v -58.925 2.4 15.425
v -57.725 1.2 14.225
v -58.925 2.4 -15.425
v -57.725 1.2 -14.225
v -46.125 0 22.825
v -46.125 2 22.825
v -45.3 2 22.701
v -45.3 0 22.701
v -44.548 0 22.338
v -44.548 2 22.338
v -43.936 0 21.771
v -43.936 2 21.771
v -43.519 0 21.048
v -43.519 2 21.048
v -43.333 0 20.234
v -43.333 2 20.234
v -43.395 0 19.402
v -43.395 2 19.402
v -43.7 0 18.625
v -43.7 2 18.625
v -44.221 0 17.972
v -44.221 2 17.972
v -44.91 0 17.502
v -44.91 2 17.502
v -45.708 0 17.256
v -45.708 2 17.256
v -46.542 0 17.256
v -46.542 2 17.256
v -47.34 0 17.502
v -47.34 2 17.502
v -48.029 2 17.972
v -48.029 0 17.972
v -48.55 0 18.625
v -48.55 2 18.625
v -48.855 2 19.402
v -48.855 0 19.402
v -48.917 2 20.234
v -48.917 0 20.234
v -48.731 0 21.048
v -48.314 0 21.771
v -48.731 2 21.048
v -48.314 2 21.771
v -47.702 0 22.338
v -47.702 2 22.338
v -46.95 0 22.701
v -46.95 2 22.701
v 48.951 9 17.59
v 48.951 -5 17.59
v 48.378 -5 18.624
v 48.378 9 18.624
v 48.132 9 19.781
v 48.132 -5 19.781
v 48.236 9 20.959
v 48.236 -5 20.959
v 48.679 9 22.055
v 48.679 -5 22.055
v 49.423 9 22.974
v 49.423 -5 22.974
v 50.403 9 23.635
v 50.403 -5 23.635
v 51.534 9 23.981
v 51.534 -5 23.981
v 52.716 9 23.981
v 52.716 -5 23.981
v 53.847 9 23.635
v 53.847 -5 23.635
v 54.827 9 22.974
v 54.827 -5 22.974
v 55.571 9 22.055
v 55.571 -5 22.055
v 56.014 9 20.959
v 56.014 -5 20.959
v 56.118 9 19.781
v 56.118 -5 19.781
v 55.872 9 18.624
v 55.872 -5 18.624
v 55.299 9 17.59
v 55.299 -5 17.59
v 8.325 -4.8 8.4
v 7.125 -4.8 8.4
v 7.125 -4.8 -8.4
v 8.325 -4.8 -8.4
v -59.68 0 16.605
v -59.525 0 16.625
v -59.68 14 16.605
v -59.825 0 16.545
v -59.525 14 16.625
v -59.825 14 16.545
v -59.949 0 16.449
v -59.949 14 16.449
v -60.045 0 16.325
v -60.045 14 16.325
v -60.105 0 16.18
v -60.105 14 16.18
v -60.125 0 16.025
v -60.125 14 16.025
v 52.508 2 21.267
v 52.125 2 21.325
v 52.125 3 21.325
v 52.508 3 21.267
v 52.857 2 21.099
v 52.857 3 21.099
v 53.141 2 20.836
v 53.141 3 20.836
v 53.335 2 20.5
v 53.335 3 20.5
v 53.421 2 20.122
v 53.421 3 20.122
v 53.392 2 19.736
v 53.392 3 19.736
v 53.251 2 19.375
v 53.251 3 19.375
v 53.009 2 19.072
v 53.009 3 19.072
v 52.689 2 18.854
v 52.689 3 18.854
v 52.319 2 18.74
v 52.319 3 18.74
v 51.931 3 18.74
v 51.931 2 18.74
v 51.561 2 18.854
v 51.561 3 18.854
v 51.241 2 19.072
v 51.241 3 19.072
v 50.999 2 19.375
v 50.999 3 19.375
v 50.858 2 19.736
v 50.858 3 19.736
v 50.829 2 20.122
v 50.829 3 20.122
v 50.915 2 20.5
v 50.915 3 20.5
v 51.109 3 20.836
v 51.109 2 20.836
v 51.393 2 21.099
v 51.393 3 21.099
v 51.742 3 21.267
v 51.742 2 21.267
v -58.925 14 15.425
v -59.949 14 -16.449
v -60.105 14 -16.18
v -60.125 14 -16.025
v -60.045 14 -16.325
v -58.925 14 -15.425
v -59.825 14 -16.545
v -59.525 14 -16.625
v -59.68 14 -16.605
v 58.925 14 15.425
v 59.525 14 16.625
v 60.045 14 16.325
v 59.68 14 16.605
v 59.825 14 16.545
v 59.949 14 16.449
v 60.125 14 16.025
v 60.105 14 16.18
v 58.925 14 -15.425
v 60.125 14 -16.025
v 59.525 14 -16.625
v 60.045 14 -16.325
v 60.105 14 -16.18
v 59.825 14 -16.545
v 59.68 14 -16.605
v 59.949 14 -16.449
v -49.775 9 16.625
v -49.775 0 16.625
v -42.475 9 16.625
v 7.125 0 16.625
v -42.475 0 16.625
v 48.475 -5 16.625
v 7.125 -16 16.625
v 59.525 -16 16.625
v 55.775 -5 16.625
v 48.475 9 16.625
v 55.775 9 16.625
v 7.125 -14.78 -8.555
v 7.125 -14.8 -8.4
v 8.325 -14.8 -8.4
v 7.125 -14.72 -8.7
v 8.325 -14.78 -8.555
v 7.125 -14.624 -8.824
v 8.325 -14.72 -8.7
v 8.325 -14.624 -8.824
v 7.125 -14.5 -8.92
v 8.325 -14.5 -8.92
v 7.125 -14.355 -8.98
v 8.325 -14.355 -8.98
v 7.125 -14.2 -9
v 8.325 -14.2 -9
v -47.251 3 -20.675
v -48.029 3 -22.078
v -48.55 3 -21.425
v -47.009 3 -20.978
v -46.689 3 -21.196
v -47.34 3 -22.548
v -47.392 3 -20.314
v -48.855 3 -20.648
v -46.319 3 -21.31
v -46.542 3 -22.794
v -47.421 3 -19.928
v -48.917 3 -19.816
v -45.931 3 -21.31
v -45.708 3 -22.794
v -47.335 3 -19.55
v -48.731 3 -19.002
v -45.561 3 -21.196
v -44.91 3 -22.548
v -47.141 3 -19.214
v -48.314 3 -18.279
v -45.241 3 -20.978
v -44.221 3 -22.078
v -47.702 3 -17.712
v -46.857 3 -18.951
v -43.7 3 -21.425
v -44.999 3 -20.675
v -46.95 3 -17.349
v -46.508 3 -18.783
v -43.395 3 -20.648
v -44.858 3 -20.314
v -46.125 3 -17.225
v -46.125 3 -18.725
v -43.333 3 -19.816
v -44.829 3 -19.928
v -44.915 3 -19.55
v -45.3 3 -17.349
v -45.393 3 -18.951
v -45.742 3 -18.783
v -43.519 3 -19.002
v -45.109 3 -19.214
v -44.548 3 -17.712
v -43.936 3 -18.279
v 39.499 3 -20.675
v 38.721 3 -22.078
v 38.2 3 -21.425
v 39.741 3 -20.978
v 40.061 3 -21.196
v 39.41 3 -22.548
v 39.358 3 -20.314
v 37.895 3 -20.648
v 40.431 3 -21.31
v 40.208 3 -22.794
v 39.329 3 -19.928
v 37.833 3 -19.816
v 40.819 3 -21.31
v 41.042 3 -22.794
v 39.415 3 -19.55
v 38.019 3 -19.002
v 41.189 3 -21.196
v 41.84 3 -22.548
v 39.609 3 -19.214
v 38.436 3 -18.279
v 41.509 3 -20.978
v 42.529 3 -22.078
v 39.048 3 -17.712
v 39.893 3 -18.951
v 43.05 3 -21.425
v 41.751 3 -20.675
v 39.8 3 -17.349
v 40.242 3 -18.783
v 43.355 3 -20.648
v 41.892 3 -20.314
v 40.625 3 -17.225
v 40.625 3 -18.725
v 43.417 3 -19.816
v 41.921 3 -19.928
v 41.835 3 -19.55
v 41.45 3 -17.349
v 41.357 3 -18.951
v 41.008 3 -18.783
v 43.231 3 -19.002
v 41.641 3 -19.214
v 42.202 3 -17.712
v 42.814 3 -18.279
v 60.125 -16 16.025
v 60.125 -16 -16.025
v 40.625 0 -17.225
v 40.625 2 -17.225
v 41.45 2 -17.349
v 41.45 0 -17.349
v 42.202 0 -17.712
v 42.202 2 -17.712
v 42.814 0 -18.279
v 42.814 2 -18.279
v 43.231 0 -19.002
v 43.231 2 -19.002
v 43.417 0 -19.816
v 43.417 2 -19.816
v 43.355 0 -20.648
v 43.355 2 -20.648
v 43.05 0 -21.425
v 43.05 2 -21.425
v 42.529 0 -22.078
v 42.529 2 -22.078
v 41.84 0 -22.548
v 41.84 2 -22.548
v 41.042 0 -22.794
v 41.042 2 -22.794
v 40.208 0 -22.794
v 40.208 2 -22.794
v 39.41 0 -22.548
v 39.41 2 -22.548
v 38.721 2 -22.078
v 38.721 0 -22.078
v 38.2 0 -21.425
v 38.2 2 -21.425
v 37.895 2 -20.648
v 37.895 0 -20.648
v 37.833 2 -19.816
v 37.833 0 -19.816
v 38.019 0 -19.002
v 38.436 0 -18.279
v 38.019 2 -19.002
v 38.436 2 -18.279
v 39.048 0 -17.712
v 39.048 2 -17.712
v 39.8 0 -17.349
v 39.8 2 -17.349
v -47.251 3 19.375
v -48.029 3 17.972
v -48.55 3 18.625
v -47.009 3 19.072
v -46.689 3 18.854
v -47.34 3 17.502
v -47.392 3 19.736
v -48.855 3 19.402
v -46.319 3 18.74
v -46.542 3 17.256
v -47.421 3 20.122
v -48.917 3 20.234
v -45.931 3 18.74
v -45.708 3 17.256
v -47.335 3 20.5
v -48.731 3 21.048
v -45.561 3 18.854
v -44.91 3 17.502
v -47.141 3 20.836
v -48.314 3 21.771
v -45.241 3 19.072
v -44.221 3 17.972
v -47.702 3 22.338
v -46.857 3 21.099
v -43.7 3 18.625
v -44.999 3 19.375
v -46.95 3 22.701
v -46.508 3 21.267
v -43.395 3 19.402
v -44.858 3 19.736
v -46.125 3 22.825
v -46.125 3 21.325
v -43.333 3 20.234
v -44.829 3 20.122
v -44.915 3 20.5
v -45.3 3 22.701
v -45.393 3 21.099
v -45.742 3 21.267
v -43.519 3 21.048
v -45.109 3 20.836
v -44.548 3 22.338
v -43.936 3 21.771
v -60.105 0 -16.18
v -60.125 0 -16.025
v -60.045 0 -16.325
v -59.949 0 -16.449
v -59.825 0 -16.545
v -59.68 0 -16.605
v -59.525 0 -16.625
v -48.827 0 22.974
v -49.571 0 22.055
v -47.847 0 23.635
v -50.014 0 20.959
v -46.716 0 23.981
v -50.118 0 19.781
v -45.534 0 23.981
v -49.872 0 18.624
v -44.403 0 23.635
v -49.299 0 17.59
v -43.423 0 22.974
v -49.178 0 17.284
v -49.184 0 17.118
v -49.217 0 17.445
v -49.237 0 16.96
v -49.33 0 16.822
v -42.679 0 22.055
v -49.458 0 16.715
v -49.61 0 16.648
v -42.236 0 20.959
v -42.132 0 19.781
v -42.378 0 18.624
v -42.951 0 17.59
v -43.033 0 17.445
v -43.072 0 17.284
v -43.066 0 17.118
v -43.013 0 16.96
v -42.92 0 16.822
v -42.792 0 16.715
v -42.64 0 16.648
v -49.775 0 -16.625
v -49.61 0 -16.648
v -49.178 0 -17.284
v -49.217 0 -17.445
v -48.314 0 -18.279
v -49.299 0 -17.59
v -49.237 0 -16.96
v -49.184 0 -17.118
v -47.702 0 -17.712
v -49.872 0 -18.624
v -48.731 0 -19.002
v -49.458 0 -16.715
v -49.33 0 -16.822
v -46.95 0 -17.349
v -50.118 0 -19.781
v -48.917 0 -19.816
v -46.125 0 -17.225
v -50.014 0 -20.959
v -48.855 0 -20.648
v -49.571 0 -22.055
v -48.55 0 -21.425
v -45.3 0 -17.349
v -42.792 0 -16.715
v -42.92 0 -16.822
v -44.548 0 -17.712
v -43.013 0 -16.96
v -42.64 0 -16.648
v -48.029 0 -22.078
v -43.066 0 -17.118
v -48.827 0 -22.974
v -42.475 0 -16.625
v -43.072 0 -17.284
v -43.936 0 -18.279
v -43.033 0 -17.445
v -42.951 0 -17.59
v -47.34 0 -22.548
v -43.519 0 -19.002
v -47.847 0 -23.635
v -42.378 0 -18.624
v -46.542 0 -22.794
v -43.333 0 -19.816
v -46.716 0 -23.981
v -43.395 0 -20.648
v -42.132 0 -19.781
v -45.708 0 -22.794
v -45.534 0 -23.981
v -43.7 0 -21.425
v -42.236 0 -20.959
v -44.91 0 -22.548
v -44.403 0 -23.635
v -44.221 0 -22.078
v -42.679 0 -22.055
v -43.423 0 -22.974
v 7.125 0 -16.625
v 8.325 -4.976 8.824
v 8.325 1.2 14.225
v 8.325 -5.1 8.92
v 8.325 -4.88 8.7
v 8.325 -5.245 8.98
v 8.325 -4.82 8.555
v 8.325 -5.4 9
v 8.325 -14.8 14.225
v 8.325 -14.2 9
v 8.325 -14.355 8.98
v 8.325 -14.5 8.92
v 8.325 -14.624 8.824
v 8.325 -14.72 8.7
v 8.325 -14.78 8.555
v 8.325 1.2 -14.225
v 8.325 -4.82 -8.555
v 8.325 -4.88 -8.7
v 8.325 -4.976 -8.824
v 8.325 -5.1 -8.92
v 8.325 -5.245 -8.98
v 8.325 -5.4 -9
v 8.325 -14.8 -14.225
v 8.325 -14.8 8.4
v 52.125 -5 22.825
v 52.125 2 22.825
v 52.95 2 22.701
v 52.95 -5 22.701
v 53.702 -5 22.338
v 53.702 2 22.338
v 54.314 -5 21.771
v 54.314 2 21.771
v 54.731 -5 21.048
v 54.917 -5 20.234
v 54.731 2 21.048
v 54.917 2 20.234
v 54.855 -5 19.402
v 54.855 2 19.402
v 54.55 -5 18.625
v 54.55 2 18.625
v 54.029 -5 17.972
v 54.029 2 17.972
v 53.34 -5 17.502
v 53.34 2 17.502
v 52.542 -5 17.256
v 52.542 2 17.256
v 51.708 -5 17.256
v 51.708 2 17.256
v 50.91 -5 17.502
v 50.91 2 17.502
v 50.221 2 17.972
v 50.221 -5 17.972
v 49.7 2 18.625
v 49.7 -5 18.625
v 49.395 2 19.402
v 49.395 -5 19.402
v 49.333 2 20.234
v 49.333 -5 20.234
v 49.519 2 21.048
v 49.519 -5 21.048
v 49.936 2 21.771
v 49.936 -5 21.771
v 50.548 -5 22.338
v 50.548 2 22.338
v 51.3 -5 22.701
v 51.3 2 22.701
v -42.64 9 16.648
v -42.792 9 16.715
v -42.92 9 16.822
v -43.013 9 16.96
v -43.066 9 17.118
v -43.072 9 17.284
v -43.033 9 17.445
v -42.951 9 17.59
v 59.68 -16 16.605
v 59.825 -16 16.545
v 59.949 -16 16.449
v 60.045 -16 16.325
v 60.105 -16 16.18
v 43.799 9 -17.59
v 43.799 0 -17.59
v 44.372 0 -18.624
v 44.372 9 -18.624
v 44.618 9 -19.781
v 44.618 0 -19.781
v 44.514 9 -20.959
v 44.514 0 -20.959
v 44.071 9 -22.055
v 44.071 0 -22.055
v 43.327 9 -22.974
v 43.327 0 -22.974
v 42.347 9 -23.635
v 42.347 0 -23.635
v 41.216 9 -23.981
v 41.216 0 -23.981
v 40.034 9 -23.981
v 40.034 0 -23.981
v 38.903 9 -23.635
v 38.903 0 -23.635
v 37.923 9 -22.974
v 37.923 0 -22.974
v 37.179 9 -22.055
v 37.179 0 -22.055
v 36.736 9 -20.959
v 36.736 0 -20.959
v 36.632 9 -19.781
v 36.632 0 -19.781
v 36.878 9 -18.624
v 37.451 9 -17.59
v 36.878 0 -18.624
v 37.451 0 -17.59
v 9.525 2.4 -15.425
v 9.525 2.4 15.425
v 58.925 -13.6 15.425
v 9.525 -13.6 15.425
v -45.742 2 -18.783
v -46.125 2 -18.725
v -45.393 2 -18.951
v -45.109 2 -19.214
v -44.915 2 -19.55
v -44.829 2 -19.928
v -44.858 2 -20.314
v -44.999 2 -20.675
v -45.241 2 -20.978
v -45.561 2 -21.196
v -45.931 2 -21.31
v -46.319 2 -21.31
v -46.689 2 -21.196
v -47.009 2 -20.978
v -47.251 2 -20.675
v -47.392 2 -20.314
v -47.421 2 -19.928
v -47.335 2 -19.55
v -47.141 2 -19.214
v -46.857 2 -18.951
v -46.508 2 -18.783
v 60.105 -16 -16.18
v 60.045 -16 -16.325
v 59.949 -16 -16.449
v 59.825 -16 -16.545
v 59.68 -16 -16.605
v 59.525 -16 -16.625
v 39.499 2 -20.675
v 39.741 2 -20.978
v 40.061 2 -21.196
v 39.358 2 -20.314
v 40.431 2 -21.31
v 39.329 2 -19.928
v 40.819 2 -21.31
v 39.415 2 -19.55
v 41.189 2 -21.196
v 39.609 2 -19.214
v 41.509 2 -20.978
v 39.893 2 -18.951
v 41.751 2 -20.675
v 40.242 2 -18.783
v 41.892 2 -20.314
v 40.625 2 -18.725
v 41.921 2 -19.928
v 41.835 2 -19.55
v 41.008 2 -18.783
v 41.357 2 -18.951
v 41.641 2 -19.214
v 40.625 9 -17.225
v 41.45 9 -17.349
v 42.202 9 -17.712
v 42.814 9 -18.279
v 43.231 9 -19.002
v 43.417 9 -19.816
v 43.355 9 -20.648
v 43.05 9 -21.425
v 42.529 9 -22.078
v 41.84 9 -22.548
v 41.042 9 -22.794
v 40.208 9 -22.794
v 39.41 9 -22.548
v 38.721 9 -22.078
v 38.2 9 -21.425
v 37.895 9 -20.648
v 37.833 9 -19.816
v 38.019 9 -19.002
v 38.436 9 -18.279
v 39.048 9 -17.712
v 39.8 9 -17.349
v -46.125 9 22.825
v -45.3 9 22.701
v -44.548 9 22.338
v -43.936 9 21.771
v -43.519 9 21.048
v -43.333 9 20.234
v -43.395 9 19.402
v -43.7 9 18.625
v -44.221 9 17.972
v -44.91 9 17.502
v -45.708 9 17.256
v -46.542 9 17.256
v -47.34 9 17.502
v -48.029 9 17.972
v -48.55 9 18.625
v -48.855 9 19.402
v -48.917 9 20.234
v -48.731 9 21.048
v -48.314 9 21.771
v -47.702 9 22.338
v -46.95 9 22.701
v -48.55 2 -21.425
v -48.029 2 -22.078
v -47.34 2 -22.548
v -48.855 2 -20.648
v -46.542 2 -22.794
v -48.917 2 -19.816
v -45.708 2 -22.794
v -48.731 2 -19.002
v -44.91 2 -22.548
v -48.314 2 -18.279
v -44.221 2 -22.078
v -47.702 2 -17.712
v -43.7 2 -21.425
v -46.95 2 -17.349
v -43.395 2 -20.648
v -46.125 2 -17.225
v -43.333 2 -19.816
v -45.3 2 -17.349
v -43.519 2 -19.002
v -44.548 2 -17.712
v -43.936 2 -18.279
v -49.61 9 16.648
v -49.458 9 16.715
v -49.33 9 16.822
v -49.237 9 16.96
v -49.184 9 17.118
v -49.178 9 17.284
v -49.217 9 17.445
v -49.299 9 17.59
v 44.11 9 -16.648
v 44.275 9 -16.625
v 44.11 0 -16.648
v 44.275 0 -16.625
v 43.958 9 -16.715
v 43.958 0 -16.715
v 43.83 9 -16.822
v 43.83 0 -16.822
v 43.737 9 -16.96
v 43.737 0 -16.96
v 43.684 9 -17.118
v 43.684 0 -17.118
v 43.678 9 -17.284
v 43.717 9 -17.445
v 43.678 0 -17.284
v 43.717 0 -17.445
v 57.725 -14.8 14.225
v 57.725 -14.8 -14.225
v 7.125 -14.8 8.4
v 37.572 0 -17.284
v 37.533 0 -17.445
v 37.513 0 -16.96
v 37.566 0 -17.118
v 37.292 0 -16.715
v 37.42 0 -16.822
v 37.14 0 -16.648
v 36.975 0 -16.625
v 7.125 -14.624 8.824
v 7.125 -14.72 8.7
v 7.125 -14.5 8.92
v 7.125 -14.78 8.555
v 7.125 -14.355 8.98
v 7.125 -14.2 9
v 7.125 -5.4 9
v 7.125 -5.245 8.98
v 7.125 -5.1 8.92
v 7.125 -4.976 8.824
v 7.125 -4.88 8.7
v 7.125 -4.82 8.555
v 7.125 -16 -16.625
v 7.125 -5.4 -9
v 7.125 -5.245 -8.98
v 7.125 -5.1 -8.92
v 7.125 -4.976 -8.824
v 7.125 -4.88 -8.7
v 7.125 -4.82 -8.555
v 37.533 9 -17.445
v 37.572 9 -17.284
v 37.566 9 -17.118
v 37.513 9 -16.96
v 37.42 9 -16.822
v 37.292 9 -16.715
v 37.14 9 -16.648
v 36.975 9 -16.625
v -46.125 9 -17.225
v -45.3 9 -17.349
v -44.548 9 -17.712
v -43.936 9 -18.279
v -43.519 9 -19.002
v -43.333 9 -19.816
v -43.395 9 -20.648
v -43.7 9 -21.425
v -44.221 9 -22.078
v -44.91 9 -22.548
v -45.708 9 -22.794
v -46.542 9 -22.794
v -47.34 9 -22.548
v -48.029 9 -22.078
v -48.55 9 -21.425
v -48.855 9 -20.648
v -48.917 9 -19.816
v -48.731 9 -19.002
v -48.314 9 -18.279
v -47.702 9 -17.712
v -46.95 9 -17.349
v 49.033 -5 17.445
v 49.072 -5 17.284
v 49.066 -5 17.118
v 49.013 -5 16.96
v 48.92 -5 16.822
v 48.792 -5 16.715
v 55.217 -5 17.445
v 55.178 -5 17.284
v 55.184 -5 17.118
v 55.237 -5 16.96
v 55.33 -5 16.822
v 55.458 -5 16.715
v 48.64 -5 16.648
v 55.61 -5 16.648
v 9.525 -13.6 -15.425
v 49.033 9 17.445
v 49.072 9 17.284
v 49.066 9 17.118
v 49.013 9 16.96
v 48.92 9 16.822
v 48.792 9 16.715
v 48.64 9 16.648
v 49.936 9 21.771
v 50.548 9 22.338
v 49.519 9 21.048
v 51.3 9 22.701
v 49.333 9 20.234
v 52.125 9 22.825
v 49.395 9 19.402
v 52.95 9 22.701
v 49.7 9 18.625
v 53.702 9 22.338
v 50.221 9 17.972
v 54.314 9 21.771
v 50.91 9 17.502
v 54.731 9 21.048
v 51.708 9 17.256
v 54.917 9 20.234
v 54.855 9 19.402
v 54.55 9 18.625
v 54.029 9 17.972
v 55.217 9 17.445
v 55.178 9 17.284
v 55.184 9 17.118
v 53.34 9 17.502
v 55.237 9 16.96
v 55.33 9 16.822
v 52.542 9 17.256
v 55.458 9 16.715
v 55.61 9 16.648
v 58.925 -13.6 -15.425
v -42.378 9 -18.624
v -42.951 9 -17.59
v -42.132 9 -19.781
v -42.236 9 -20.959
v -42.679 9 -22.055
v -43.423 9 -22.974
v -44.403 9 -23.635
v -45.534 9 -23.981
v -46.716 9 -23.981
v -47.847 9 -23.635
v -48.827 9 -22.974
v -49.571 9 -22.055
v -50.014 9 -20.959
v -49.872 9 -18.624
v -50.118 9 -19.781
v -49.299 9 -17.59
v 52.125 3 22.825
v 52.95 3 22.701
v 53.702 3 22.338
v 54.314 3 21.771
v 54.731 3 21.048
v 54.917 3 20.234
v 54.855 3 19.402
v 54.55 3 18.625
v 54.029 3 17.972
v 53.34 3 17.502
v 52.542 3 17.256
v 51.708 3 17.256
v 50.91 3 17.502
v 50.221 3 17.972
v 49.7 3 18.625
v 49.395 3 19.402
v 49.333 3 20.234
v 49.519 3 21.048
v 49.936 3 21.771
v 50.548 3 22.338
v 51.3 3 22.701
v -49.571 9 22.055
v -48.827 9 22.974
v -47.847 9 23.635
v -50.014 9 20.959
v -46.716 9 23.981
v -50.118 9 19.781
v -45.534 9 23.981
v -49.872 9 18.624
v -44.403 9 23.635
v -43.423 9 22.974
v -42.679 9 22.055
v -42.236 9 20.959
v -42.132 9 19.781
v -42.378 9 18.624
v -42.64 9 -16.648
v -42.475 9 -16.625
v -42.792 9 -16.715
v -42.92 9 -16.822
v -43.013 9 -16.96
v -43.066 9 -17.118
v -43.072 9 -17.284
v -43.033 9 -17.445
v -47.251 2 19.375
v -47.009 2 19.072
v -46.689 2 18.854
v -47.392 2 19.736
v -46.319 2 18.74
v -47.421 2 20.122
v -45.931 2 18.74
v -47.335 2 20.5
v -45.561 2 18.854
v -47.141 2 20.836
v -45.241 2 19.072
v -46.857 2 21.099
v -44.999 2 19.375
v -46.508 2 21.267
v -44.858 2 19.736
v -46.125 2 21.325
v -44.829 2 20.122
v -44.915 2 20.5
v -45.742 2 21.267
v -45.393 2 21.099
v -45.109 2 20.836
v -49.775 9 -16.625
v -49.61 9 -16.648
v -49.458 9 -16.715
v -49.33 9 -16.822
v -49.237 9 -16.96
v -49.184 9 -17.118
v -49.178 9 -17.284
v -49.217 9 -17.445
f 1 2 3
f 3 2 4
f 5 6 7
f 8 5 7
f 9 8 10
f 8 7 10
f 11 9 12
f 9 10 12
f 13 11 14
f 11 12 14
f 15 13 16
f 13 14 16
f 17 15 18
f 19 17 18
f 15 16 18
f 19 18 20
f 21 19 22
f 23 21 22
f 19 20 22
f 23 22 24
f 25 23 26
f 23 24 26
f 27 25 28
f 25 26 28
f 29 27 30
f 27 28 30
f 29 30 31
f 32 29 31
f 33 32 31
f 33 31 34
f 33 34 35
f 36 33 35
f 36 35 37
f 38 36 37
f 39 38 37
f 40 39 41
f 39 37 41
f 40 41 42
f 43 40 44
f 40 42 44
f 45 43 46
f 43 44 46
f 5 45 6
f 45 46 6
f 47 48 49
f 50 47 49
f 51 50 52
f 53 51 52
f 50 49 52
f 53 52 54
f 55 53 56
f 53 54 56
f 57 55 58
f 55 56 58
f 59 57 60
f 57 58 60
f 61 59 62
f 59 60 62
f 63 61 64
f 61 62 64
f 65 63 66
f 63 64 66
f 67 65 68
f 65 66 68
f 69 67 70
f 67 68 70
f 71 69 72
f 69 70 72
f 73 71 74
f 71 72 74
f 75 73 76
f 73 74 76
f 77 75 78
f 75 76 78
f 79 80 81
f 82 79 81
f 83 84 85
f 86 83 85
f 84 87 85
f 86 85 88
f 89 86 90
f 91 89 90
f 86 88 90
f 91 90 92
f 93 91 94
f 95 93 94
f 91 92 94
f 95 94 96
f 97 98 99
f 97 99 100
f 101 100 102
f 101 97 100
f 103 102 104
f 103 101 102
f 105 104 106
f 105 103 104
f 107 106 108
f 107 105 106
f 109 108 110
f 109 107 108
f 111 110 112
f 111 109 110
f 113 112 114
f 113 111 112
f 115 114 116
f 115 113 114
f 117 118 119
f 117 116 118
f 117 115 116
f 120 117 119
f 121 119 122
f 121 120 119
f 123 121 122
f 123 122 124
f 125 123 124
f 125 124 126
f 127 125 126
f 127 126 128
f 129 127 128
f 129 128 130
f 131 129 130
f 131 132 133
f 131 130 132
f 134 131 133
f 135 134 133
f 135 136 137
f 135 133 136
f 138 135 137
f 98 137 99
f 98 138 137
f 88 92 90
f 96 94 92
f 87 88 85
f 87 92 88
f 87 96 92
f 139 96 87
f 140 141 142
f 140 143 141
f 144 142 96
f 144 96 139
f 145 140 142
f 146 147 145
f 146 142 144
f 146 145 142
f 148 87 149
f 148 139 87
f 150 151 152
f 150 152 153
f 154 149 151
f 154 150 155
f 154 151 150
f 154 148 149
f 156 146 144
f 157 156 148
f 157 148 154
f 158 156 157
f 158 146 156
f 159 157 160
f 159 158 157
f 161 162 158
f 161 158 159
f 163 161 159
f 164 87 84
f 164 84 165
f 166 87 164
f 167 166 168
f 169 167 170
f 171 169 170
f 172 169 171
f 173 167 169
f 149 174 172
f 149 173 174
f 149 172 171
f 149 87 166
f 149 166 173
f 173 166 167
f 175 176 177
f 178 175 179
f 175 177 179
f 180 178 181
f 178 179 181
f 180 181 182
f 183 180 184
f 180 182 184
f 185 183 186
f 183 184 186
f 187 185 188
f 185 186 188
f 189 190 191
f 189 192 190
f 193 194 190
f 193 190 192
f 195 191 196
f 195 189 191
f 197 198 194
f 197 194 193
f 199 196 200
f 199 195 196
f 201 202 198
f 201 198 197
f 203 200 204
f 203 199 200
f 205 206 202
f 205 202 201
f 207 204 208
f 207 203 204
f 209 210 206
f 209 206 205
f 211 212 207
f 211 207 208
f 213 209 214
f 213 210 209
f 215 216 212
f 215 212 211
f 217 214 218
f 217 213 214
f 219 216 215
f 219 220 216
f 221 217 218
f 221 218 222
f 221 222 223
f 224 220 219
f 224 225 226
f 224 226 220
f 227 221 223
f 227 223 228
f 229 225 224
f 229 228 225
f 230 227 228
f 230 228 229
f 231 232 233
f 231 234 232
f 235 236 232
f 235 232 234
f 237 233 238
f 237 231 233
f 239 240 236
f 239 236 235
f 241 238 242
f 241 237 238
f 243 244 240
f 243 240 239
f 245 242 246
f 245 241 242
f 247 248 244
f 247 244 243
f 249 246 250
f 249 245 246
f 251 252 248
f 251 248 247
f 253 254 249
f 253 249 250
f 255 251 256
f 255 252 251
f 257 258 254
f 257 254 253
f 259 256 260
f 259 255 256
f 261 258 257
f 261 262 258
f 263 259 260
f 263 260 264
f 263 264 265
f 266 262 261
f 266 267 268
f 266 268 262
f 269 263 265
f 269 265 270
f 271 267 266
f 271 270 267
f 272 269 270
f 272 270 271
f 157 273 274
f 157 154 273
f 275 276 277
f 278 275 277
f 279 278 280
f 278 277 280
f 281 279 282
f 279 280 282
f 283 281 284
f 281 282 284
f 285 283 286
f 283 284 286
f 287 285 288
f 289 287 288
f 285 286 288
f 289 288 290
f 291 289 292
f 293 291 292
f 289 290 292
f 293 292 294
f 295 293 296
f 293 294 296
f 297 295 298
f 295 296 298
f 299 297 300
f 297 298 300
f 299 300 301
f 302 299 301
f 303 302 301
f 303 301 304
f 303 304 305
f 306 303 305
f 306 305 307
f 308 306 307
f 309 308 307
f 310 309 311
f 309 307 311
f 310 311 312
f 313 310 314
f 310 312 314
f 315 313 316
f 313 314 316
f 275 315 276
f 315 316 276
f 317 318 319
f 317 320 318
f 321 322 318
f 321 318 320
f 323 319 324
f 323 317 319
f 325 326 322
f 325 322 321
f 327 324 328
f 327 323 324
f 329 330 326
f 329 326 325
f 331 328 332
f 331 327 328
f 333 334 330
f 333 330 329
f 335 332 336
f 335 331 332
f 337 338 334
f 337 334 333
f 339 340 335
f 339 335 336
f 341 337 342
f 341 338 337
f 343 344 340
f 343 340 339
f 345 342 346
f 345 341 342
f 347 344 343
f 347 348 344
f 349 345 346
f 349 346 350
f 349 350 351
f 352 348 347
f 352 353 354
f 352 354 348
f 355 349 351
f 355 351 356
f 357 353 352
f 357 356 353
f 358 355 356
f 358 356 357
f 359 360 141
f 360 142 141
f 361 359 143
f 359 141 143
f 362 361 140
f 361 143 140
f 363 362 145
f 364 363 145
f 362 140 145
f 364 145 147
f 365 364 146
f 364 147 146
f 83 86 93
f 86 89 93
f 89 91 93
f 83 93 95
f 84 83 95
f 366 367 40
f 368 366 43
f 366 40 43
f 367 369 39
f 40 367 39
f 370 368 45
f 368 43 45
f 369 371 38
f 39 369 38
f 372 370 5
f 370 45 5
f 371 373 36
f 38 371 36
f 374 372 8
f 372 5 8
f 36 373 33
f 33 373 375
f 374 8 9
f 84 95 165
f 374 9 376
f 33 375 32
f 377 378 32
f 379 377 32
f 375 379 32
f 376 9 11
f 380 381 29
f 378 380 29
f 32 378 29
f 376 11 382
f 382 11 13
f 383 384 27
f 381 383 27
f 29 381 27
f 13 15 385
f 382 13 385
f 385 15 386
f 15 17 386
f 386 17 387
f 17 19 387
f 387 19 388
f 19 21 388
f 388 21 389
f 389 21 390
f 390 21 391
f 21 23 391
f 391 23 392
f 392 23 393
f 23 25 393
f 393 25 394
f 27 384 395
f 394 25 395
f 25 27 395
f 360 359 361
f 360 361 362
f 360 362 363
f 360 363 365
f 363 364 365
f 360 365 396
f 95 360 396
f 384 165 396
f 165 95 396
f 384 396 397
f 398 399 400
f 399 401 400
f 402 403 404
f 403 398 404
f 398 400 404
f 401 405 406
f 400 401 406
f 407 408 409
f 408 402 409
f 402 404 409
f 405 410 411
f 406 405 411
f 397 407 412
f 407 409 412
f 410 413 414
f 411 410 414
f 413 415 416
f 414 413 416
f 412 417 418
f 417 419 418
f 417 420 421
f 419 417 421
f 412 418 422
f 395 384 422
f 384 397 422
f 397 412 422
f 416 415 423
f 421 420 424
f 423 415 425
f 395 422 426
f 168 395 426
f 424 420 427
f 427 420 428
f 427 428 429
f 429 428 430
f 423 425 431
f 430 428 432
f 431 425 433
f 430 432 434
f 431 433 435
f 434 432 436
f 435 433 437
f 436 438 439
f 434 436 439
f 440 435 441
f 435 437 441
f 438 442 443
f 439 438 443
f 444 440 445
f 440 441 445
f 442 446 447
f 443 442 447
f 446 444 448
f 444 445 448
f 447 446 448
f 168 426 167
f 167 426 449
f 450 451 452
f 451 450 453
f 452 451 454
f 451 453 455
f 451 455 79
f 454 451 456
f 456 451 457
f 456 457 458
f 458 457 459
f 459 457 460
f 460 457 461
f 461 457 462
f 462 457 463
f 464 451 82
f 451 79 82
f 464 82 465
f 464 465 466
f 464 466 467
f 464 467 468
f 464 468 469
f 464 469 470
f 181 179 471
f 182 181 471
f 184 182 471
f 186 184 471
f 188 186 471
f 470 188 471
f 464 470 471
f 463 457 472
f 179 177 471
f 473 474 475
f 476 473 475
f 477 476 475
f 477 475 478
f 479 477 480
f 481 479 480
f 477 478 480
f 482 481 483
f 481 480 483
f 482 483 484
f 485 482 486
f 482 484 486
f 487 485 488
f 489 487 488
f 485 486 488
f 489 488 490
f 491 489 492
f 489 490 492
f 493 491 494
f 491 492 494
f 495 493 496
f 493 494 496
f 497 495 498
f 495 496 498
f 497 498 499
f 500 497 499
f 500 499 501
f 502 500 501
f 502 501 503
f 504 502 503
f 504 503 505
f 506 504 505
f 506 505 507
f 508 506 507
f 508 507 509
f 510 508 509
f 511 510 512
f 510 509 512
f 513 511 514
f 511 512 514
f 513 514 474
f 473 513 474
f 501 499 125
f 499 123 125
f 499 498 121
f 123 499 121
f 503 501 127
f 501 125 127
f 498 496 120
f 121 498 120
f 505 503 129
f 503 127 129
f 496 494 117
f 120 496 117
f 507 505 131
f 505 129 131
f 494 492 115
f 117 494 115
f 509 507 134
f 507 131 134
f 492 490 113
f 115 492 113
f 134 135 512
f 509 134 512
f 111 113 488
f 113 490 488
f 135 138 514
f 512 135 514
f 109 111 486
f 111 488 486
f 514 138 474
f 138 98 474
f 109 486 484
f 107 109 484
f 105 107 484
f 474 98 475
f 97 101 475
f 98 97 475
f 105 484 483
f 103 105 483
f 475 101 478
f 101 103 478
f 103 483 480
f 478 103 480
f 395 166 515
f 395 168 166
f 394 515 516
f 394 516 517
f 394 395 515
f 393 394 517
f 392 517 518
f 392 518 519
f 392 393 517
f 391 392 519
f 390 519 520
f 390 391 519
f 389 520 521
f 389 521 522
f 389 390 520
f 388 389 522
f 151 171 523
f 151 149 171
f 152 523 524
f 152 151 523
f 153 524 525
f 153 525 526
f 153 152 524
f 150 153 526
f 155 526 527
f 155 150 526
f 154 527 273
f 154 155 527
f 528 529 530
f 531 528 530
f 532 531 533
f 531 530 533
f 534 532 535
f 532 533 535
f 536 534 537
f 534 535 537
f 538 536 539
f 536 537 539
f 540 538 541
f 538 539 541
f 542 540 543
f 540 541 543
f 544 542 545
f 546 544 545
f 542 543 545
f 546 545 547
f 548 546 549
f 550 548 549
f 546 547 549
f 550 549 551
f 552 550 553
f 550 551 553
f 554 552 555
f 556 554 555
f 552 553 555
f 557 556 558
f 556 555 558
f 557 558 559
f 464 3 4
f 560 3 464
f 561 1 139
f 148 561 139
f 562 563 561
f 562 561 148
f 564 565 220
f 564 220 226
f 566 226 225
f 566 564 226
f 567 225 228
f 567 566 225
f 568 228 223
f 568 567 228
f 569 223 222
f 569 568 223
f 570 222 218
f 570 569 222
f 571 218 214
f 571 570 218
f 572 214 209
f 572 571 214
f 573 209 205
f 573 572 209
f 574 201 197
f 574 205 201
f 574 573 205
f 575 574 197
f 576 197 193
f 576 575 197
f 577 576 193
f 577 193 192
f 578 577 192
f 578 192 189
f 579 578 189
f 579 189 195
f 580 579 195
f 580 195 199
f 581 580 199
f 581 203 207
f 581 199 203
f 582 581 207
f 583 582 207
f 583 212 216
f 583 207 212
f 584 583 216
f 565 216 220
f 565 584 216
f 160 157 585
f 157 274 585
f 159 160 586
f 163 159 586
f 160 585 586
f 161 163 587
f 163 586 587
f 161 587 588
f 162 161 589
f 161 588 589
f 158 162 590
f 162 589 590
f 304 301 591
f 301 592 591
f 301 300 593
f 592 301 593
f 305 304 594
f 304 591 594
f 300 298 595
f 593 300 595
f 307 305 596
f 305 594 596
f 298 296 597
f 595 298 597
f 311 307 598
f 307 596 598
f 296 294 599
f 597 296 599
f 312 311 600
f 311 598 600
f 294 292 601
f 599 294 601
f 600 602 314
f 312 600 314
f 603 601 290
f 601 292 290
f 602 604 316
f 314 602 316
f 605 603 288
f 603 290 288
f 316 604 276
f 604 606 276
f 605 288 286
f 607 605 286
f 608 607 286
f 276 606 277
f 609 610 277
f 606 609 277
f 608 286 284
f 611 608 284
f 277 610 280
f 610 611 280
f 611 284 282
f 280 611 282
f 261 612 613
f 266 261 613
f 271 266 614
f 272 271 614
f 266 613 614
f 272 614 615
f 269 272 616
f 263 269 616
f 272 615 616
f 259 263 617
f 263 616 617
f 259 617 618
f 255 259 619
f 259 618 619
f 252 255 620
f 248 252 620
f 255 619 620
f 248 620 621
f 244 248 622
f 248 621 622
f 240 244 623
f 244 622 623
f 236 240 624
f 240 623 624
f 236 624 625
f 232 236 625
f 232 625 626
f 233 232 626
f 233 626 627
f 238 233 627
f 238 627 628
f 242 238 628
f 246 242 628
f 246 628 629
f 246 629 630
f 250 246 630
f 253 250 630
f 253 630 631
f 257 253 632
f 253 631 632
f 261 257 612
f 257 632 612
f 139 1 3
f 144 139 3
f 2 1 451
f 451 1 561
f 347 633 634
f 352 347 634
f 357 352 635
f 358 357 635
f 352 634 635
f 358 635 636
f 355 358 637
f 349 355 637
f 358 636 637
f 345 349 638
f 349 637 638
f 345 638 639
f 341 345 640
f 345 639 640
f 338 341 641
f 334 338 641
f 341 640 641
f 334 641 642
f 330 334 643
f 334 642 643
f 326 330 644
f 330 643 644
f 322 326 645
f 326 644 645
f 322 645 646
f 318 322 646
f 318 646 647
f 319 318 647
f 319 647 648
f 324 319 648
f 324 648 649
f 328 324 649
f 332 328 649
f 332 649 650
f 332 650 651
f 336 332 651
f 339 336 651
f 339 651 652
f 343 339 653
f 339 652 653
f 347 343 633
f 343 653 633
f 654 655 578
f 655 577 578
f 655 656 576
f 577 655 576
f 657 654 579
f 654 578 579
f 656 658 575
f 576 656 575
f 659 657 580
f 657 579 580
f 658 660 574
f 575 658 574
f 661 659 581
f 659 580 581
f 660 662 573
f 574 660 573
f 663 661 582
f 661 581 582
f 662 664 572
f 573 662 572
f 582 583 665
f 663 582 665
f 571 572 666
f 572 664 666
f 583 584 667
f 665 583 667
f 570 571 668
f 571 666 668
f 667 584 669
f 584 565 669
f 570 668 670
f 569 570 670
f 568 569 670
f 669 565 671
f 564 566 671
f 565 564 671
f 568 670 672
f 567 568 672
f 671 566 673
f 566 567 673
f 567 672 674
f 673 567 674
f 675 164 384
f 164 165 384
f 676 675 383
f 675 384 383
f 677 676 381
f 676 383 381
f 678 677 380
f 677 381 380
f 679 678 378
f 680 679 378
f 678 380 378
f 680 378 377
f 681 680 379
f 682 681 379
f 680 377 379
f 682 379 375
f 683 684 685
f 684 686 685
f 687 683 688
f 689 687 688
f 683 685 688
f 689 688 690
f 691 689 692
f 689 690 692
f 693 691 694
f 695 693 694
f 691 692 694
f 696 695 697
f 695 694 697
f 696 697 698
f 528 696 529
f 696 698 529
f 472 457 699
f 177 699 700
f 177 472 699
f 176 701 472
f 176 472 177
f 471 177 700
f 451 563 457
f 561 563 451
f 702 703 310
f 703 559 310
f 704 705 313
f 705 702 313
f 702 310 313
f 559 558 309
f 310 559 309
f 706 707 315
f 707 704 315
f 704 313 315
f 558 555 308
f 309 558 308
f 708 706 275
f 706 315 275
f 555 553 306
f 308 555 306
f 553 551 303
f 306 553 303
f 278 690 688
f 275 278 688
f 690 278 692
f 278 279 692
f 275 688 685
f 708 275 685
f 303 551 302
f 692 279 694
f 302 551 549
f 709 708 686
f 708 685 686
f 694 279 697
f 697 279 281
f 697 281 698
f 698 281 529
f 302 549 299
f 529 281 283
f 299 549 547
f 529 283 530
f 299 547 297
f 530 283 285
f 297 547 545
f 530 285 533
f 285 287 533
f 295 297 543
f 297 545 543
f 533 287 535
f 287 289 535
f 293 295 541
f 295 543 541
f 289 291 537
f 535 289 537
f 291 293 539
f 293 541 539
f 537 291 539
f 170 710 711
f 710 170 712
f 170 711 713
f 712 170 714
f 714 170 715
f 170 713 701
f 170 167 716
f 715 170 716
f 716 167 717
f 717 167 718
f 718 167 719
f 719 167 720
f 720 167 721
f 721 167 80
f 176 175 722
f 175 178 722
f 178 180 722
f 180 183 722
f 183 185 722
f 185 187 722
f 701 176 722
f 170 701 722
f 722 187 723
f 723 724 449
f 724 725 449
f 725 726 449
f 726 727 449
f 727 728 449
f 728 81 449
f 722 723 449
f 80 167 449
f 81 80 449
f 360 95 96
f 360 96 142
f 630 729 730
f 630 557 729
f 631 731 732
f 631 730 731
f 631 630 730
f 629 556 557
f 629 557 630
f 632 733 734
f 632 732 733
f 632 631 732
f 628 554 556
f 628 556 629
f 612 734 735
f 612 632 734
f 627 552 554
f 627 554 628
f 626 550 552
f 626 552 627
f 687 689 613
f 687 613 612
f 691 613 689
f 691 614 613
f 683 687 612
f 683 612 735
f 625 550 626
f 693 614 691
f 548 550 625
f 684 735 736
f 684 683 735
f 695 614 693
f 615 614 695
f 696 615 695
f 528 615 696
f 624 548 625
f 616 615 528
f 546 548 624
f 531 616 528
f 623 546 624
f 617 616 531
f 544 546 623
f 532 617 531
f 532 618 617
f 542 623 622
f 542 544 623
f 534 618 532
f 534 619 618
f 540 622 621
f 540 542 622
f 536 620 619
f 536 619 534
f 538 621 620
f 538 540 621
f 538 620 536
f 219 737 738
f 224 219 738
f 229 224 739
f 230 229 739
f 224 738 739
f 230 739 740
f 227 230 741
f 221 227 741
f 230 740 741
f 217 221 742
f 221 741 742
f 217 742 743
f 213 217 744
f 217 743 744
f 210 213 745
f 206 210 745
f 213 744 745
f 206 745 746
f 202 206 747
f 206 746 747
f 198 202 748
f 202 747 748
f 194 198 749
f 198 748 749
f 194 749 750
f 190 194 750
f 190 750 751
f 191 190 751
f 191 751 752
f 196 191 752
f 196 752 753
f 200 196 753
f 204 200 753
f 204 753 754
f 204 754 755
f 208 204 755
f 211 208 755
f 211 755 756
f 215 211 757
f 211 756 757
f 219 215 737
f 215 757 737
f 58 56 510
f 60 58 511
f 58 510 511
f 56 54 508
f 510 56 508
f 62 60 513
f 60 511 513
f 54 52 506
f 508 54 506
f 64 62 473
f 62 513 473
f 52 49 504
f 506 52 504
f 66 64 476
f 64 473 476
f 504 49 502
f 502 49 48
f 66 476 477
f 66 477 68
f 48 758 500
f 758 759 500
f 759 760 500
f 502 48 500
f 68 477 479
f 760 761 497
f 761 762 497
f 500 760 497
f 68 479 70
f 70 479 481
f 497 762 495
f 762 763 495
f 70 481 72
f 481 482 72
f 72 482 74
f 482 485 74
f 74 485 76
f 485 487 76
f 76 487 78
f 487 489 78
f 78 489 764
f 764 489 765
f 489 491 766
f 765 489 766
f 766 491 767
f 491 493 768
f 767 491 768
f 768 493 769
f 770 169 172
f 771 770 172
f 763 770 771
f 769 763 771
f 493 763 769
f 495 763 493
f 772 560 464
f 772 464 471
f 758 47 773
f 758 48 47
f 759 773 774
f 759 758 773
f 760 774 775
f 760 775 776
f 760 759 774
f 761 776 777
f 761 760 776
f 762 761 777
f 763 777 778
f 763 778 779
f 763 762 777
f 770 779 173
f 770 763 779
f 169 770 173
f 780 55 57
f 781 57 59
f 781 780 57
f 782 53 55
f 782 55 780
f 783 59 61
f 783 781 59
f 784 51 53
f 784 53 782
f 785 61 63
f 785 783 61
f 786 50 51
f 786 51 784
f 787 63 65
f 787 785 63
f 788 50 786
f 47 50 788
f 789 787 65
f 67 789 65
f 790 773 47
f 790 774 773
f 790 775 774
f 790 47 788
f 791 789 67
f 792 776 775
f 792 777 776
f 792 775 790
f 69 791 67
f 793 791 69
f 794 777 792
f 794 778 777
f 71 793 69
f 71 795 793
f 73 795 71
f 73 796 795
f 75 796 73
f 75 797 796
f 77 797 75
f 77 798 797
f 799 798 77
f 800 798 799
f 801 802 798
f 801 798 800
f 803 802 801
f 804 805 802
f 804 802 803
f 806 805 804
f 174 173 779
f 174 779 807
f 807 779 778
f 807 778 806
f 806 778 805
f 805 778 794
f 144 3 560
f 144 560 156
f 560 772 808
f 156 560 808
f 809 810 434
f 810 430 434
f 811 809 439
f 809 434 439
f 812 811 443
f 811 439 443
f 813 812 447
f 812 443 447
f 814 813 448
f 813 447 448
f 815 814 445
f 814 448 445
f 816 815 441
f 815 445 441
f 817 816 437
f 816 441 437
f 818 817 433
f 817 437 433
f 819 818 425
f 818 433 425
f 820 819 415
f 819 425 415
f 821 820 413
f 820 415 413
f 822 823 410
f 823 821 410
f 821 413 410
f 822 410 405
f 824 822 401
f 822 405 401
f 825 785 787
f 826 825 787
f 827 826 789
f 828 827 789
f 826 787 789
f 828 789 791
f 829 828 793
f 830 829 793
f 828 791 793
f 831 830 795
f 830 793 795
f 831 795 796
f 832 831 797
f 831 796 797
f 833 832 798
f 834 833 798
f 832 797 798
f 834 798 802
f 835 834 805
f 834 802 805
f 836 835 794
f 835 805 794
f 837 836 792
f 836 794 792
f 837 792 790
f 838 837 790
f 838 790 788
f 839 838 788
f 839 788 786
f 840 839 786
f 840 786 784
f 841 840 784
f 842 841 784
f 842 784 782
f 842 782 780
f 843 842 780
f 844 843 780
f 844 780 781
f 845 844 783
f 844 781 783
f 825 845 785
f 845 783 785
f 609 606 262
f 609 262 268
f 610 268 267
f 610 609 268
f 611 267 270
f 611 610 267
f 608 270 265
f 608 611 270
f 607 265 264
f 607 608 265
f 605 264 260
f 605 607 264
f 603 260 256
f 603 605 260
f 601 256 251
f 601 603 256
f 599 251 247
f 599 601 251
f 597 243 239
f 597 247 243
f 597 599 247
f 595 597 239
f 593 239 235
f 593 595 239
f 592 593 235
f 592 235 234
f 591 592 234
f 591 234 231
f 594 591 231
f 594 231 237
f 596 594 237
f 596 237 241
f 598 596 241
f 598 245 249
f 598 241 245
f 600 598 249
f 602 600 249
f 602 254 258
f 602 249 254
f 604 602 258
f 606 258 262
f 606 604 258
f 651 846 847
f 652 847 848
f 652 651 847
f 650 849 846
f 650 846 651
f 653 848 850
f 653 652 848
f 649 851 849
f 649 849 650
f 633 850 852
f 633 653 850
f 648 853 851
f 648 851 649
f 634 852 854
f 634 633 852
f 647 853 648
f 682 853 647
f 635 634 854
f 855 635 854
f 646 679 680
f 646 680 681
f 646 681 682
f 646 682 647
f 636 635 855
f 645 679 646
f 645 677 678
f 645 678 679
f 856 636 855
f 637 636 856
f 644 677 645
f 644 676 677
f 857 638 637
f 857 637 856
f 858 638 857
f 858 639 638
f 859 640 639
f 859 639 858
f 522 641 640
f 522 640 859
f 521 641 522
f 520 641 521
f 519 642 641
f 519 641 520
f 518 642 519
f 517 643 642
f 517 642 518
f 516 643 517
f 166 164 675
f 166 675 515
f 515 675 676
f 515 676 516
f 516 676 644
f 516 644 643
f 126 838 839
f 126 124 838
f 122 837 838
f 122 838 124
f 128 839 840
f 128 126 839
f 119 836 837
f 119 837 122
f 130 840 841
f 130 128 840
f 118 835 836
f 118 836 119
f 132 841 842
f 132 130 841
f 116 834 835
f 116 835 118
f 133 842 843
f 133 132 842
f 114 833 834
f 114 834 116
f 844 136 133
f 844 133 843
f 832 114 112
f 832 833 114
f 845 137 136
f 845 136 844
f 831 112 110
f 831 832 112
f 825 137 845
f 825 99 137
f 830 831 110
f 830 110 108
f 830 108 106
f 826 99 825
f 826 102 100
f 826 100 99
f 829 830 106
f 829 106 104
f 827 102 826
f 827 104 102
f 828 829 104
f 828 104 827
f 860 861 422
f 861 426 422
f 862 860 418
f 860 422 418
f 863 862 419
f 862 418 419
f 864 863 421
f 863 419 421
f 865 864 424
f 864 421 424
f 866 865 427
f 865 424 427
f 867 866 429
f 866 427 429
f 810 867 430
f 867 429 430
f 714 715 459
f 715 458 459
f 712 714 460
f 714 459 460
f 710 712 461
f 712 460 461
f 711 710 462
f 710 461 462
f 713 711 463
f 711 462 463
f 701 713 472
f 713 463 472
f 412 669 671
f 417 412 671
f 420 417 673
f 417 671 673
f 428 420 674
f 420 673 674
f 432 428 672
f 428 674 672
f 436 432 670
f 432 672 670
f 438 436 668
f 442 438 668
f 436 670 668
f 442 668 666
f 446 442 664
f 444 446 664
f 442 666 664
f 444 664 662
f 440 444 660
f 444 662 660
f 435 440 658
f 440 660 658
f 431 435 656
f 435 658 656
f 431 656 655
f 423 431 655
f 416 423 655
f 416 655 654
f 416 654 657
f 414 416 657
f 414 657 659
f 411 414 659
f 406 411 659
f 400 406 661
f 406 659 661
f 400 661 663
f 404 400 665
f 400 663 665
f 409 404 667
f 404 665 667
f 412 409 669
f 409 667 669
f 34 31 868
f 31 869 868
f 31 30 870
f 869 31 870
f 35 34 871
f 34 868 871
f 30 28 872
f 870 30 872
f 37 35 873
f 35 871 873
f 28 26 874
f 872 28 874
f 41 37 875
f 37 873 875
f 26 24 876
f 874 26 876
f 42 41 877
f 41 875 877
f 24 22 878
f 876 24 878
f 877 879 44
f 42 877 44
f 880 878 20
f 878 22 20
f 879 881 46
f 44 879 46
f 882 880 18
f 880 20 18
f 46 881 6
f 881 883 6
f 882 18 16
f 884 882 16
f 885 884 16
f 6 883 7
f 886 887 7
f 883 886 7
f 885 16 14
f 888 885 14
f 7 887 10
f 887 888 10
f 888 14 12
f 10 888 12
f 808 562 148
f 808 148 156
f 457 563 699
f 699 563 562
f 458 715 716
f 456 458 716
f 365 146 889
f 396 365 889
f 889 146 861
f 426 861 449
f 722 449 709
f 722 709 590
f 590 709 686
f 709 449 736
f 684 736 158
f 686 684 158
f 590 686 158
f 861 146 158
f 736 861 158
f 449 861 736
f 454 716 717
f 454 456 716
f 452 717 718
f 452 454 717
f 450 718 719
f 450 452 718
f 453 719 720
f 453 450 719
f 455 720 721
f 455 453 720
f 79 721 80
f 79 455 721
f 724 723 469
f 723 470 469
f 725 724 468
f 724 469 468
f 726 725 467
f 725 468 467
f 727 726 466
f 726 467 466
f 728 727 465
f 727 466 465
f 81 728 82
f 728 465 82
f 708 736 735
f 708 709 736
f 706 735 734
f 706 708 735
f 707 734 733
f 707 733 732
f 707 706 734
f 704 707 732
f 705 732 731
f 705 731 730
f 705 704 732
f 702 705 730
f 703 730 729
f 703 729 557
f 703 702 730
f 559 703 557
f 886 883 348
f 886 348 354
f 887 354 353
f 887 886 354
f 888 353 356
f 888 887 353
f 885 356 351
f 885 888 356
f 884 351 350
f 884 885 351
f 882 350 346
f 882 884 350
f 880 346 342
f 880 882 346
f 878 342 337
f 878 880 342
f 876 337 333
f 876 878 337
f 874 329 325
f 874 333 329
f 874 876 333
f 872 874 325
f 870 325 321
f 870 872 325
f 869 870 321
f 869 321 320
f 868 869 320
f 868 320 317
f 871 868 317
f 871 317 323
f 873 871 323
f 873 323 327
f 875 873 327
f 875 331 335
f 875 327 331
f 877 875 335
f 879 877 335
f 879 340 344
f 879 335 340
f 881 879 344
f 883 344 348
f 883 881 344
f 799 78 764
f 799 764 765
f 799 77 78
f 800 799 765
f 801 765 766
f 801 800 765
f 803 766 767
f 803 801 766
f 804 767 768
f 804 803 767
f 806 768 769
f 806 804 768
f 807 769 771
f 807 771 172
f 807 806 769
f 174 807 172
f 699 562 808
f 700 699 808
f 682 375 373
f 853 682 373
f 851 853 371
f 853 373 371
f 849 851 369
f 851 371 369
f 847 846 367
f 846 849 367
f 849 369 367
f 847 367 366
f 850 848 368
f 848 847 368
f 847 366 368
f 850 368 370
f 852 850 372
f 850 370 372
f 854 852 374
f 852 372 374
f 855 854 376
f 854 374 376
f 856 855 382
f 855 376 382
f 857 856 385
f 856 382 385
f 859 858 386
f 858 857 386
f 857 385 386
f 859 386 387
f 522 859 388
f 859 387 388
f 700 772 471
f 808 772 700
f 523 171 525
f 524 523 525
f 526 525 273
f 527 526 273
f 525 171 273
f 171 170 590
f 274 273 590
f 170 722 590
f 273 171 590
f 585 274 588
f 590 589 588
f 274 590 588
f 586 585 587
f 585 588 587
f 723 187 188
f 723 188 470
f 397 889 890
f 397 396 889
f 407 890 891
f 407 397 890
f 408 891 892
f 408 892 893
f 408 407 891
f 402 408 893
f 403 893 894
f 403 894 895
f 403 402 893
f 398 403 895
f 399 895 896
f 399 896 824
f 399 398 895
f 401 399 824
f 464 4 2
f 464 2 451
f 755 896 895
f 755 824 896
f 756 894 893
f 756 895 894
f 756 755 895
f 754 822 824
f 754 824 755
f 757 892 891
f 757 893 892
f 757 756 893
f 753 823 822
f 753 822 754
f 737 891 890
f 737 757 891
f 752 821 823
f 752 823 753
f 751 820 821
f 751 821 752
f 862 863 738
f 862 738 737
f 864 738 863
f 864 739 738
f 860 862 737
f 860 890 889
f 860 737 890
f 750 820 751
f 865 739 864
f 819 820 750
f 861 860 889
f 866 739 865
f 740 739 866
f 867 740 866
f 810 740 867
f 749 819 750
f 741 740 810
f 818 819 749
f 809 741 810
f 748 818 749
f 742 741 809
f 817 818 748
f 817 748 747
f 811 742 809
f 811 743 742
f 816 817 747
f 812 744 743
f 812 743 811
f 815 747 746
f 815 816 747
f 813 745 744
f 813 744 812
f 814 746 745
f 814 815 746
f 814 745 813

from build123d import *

# Parameters (mm, degrees)
SKETCH1_W                      = 120.25
SKETCH1_H                      = 33.25
BOSS_EXTRUDE1_DEPTH            = 14
CUT_EXTRUDE1_REACH             = 67.133
CUT_EXTRUDE1_START             = 1.2
SKETCH1_3_W                    = 117.85
SKETCH1_3_H                    = 30.85
SKETCH2_W                      = 53
SKETCH2_H                      = 33.25
BOSS_EXTRUDE2_DEPTH            = 16
SKETCH2_3_W                    = 50.6
SKETCH2_3_H                    = 30.85
CUT_EXTRUDE2_DEPTH             = 14.8
CUT_EXTRUDE2_DIRECTION_2_REACH = 66.4
SKETCH3_W                      = 18
SKETCH3_H                      = 10
CUT_EXTRUDE4_DEPTH             = 8.325
SKETCH1_4_R                    = 4
BOSS_EXTRUDE3_DEPTH            = 9
BOSS_EXTRUDE4_START            = -5
SKETCH1_5_R                    = 4
BOSS_EXTRUDE4_DEPTH            = 5
CUT_EXTRUDE5_START             = 9
SKETCH1_6_R                    = 2.8
CUT_EXTRUDE5_DEPTH             = 6
CUT_EXTRUDE6_START             = 2
SKETCH1_7_R                    = 2.8
CUT_EXTRUDE6_DEPTH             = 7
CUT_EXTRUDE7_DEPTH             = 67.694949209
CUT_EXTRUDE7_DEPTH_BACK        = 67.694949209
SKETCH1_8_R                    = 1.3
CUT_EXTRUDE8_START             = 2
SKETCH1_9_R                    = 2.8
CUT_EXTRUDE8_DEPTH             = 2
FILLET1_R                      = 0.6
CHAMFER1_SIZE                  = 1.2


with BuildPart() as part:
    # Sketch1 → Boss-Extrude1 (new body)
    with BuildSketch(Plane(origin=(0, 0, 0), x_dir=(1, 0, 0), z_dir=(0, 1, 0))):
        Rectangle(SKETCH1_W, SKETCH1_H)
    extrude(amount=BOSS_EXTRUDE1_DEPTH)

    # Sketch1<3> → Cut-Extrude1 (cut, up to next)
    with BuildSketch(Plane(origin=(0, 0, 0), x_dir=(1, 0, 0), z_dir=(0, 1, 0)).offset(CUT_EXTRUDE1_START), mode=Mode.PRIVATE) as cut_extrude1_sk1:
        Rectangle(SKETCH1_3_W, SKETCH1_3_H)
    cut_extrude1_tool1 = extrude(cut_extrude1_sk1.sketch, amount=CUT_EXTRUDE1_REACH, mode=Mode.PRIVATE) & part.part
    add(cut_extrude1_tool1.solids().sort_by_distance((0, 1.2, 0))[0], mode=Mode.SUBTRACT)

    # Sketch2 → Boss-Extrude2 (add)
    with BuildSketch(Plane(origin=(0, 0, 0), x_dir=(1, 0, 0), z_dir=(0, 1, 0))):
        with Locations((33.625, 0)):
            Rectangle(SKETCH2_W, SKETCH2_H)
    extrude(amount=-BOSS_EXTRUDE2_DEPTH)

    # Sketch2<3> → Cut-Extrude2 (cut)
    with BuildSketch(Plane(origin=(0, 0, 0), x_dir=(1, 0, 0), z_dir=(0, 1, 0))):
        with Locations((33.625, 0)):
            Rectangle(SKETCH2_3_W, SKETCH2_3_H)
    extrude(amount=-CUT_EXTRUDE2_DEPTH, mode=Mode.SUBTRACT)

    # Sketch2<3> → Cut-Extrude2 direction 2 (cut, up to next)
    with BuildSketch(Plane(origin=(0, 0, 0), x_dir=(1, 0, 0), z_dir=(0, 1, 0)), mode=Mode.PRIVATE) as cut_extrude2_direction_2_sk1:
        with Locations((33.625, 0)):
            Rectangle(SKETCH2_3_W, SKETCH2_3_H)
    cut_extrude2_direction_2_tool1 = extrude(cut_extrude2_direction_2_sk1.sketch, amount=CUT_EXTRUDE2_DIRECTION_2_REACH, mode=Mode.PRIVATE) & part.part
    add(cut_extrude2_direction_2_tool1.solids().sort_by_distance((33.625, 0, 0))[0], mode=Mode.SUBTRACT)

    # Sketch3 → Cut-Extrude4 (cut)
    with BuildSketch(Plane(origin=(0, 0, 0), x_dir=(0, 0, -1), z_dir=(1, 0, 0))):
        with Locations((0, -9.8)):
            Rectangle(SKETCH3_W, SKETCH3_H)
    extrude(amount=CUT_EXTRUDE4_DEPTH, mode=Mode.SUBTRACT)

    # Sketch1<4> → Boss-Extrude3 (add)
    with BuildSketch(Plane(origin=(0, 0, 0), x_dir=(1, 0, 0), z_dir=(0, 1, 0))):
        with Locations((-46.125, -20.025)):
            Circle(SKETCH1_4_R)
        with Locations((52.125, -20.025)):
            Circle(SKETCH1_4_R)
        with Locations((-46.125, 20.025)):
            Circle(SKETCH1_4_R)
        with Locations((40.625, 20.025)):
            Circle(SKETCH1_4_R)
    extrude(amount=BOSS_EXTRUDE3_DEPTH)

    # Sketch1<5> → Boss-Extrude4 (add)
    with BuildSketch(Plane(origin=(0, 0, 0), x_dir=(1, 0, 0), z_dir=(0, 1, 0)).offset(BOSS_EXTRUDE4_START)):
        with Locations((52.125, -20.025)):
            Circle(SKETCH1_5_R)
    extrude(amount=BOSS_EXTRUDE4_DEPTH)

    # Sketch1<6> → Cut-Extrude5 (cut)
    with BuildSketch(Plane(origin=(0, 0, 0), x_dir=(1, 0, 0), z_dir=(0, 1, 0)).offset(CUT_EXTRUDE5_START)):
        with Locations(Location((-46.125, 20.025, 0), (0, 0, 270))):
            Circle(SKETCH1_6_R)
        with Locations(Location((-46.125, -20.025, 0), (0, 0, 270))):
            Circle(SKETCH1_6_R)
        with Locations(Location((52.125, -20.025, 0), (0, 0, 270))):
            Circle(SKETCH1_6_R)
        with Locations(Location((40.625, 20.025, 0), (0, 0, 270))):
            Circle(SKETCH1_6_R)
    extrude(amount=-CUT_EXTRUDE5_DEPTH, mode=Mode.SUBTRACT)

    # Sketch1<7> → Cut-Extrude6 (cut)
    with BuildSketch(Plane(origin=(0, 0, 0), x_dir=(1, 0, 0), z_dir=(0, 1, 0)).offset(CUT_EXTRUDE6_START)):
        with Locations(Location((52.125, -20.025, 0), (0, 0, 270))):
            Circle(SKETCH1_7_R)
    extrude(amount=-CUT_EXTRUDE6_DEPTH, mode=Mode.SUBTRACT)

    # Sketch1<8> → Cut-Extrude7 (cut, two sides: drawn at the far end of the back side and taken through both)
    with BuildSketch(Plane(origin=(0, 0, 0), x_dir=(1, 0, 0), z_dir=(0, 1, 0)).offset(-CUT_EXTRUDE7_DEPTH_BACK)):
        with Locations(Location((-46.125, 20.025, 0), (0, 0, 270))):
            Circle(SKETCH1_8_R)
        with Locations(Location((-46.125, -20.025, 0), (0, 0, 270))):
            Circle(SKETCH1_8_R)
        with Locations(Location((52.125, -20.025, 0), (0, 0, 270))):
            Circle(SKETCH1_8_R)
        with Locations(Location((40.625, 20.025, 0), (0, 0, 270))):
            Circle(SKETCH1_8_R)
    extrude(amount=CUT_EXTRUDE7_DEPTH + CUT_EXTRUDE7_DEPTH_BACK, mode=Mode.SUBTRACT)

    # Sketch1<9> → Cut-Extrude8 (cut)
    with BuildSketch(Plane(origin=(0, 0, 0), x_dir=(1, 0, 0), z_dir=(0, 1, 0)).offset(CUT_EXTRUDE8_START)):
        with Locations(Location((-46.125, 20.025, 0), (0, 0, 270))):
            Circle(SKETCH1_9_R)
        with Locations(Location((-46.125, -20.025, 0), (0, 0, 270))):
            Circle(SKETCH1_9_R)
        with Locations(Location((40.625, 20.025, 0), (0, 0, 270))):
            Circle(SKETCH1_9_R)
    extrude(amount=-CUT_EXTRUDE8_DEPTH, mode=Mode.SUBTRACT)

    # Fillet1
    fillet1_edges = [part.edges().sort_by_distance(p)[0] for p in [
        (7.725, -4.8, 9),
        (7.725, -14.8, 9),
        (7.725, -14.8, -9),
        (7.725, -4.8, -9),
        (54.232130751, 2, 16.625),
        (50.017869249, 2, 16.625),
        (60.125, -1, 16.625),
        (-48.232130751, 4.5, 16.625),
        (-44.017869249, 4.5, 16.625),
        (-60.125, 7, 16.625),
        (-60.125, 7, -16.625),
        (60.125, -1, -16.625),
        (42.732130751, 4.5, -16.625),
        (38.517869249, 4.5, -16.625),
        (-48.232130751, 4.5, -16.625),
        (-44.017869249, 4.5, -16.625),
    ]]
    fillet(fillet1_edges, radius=FILLET1_R)

    # Chamfer1
    chamfer1_edges = [part.edges().sort_by_distance(p)[0] for p in [
        (-58.925, 1.2, 0),
        (-25.3, 1.2, -15.425),
        (-25.3, 1.2, 15.425),
        (8.325, -6.8, -15.425),
        (8.325, -6.8, 15.425),
        (33.625, -14.8, 15.425),
        (58.925, -14.8, 0),
        (33.625, -14.8, -15.425),
    ]]
    chamfer(chamfer1_edges, length=CHAMFER1_SIZE)


solid = part.part
